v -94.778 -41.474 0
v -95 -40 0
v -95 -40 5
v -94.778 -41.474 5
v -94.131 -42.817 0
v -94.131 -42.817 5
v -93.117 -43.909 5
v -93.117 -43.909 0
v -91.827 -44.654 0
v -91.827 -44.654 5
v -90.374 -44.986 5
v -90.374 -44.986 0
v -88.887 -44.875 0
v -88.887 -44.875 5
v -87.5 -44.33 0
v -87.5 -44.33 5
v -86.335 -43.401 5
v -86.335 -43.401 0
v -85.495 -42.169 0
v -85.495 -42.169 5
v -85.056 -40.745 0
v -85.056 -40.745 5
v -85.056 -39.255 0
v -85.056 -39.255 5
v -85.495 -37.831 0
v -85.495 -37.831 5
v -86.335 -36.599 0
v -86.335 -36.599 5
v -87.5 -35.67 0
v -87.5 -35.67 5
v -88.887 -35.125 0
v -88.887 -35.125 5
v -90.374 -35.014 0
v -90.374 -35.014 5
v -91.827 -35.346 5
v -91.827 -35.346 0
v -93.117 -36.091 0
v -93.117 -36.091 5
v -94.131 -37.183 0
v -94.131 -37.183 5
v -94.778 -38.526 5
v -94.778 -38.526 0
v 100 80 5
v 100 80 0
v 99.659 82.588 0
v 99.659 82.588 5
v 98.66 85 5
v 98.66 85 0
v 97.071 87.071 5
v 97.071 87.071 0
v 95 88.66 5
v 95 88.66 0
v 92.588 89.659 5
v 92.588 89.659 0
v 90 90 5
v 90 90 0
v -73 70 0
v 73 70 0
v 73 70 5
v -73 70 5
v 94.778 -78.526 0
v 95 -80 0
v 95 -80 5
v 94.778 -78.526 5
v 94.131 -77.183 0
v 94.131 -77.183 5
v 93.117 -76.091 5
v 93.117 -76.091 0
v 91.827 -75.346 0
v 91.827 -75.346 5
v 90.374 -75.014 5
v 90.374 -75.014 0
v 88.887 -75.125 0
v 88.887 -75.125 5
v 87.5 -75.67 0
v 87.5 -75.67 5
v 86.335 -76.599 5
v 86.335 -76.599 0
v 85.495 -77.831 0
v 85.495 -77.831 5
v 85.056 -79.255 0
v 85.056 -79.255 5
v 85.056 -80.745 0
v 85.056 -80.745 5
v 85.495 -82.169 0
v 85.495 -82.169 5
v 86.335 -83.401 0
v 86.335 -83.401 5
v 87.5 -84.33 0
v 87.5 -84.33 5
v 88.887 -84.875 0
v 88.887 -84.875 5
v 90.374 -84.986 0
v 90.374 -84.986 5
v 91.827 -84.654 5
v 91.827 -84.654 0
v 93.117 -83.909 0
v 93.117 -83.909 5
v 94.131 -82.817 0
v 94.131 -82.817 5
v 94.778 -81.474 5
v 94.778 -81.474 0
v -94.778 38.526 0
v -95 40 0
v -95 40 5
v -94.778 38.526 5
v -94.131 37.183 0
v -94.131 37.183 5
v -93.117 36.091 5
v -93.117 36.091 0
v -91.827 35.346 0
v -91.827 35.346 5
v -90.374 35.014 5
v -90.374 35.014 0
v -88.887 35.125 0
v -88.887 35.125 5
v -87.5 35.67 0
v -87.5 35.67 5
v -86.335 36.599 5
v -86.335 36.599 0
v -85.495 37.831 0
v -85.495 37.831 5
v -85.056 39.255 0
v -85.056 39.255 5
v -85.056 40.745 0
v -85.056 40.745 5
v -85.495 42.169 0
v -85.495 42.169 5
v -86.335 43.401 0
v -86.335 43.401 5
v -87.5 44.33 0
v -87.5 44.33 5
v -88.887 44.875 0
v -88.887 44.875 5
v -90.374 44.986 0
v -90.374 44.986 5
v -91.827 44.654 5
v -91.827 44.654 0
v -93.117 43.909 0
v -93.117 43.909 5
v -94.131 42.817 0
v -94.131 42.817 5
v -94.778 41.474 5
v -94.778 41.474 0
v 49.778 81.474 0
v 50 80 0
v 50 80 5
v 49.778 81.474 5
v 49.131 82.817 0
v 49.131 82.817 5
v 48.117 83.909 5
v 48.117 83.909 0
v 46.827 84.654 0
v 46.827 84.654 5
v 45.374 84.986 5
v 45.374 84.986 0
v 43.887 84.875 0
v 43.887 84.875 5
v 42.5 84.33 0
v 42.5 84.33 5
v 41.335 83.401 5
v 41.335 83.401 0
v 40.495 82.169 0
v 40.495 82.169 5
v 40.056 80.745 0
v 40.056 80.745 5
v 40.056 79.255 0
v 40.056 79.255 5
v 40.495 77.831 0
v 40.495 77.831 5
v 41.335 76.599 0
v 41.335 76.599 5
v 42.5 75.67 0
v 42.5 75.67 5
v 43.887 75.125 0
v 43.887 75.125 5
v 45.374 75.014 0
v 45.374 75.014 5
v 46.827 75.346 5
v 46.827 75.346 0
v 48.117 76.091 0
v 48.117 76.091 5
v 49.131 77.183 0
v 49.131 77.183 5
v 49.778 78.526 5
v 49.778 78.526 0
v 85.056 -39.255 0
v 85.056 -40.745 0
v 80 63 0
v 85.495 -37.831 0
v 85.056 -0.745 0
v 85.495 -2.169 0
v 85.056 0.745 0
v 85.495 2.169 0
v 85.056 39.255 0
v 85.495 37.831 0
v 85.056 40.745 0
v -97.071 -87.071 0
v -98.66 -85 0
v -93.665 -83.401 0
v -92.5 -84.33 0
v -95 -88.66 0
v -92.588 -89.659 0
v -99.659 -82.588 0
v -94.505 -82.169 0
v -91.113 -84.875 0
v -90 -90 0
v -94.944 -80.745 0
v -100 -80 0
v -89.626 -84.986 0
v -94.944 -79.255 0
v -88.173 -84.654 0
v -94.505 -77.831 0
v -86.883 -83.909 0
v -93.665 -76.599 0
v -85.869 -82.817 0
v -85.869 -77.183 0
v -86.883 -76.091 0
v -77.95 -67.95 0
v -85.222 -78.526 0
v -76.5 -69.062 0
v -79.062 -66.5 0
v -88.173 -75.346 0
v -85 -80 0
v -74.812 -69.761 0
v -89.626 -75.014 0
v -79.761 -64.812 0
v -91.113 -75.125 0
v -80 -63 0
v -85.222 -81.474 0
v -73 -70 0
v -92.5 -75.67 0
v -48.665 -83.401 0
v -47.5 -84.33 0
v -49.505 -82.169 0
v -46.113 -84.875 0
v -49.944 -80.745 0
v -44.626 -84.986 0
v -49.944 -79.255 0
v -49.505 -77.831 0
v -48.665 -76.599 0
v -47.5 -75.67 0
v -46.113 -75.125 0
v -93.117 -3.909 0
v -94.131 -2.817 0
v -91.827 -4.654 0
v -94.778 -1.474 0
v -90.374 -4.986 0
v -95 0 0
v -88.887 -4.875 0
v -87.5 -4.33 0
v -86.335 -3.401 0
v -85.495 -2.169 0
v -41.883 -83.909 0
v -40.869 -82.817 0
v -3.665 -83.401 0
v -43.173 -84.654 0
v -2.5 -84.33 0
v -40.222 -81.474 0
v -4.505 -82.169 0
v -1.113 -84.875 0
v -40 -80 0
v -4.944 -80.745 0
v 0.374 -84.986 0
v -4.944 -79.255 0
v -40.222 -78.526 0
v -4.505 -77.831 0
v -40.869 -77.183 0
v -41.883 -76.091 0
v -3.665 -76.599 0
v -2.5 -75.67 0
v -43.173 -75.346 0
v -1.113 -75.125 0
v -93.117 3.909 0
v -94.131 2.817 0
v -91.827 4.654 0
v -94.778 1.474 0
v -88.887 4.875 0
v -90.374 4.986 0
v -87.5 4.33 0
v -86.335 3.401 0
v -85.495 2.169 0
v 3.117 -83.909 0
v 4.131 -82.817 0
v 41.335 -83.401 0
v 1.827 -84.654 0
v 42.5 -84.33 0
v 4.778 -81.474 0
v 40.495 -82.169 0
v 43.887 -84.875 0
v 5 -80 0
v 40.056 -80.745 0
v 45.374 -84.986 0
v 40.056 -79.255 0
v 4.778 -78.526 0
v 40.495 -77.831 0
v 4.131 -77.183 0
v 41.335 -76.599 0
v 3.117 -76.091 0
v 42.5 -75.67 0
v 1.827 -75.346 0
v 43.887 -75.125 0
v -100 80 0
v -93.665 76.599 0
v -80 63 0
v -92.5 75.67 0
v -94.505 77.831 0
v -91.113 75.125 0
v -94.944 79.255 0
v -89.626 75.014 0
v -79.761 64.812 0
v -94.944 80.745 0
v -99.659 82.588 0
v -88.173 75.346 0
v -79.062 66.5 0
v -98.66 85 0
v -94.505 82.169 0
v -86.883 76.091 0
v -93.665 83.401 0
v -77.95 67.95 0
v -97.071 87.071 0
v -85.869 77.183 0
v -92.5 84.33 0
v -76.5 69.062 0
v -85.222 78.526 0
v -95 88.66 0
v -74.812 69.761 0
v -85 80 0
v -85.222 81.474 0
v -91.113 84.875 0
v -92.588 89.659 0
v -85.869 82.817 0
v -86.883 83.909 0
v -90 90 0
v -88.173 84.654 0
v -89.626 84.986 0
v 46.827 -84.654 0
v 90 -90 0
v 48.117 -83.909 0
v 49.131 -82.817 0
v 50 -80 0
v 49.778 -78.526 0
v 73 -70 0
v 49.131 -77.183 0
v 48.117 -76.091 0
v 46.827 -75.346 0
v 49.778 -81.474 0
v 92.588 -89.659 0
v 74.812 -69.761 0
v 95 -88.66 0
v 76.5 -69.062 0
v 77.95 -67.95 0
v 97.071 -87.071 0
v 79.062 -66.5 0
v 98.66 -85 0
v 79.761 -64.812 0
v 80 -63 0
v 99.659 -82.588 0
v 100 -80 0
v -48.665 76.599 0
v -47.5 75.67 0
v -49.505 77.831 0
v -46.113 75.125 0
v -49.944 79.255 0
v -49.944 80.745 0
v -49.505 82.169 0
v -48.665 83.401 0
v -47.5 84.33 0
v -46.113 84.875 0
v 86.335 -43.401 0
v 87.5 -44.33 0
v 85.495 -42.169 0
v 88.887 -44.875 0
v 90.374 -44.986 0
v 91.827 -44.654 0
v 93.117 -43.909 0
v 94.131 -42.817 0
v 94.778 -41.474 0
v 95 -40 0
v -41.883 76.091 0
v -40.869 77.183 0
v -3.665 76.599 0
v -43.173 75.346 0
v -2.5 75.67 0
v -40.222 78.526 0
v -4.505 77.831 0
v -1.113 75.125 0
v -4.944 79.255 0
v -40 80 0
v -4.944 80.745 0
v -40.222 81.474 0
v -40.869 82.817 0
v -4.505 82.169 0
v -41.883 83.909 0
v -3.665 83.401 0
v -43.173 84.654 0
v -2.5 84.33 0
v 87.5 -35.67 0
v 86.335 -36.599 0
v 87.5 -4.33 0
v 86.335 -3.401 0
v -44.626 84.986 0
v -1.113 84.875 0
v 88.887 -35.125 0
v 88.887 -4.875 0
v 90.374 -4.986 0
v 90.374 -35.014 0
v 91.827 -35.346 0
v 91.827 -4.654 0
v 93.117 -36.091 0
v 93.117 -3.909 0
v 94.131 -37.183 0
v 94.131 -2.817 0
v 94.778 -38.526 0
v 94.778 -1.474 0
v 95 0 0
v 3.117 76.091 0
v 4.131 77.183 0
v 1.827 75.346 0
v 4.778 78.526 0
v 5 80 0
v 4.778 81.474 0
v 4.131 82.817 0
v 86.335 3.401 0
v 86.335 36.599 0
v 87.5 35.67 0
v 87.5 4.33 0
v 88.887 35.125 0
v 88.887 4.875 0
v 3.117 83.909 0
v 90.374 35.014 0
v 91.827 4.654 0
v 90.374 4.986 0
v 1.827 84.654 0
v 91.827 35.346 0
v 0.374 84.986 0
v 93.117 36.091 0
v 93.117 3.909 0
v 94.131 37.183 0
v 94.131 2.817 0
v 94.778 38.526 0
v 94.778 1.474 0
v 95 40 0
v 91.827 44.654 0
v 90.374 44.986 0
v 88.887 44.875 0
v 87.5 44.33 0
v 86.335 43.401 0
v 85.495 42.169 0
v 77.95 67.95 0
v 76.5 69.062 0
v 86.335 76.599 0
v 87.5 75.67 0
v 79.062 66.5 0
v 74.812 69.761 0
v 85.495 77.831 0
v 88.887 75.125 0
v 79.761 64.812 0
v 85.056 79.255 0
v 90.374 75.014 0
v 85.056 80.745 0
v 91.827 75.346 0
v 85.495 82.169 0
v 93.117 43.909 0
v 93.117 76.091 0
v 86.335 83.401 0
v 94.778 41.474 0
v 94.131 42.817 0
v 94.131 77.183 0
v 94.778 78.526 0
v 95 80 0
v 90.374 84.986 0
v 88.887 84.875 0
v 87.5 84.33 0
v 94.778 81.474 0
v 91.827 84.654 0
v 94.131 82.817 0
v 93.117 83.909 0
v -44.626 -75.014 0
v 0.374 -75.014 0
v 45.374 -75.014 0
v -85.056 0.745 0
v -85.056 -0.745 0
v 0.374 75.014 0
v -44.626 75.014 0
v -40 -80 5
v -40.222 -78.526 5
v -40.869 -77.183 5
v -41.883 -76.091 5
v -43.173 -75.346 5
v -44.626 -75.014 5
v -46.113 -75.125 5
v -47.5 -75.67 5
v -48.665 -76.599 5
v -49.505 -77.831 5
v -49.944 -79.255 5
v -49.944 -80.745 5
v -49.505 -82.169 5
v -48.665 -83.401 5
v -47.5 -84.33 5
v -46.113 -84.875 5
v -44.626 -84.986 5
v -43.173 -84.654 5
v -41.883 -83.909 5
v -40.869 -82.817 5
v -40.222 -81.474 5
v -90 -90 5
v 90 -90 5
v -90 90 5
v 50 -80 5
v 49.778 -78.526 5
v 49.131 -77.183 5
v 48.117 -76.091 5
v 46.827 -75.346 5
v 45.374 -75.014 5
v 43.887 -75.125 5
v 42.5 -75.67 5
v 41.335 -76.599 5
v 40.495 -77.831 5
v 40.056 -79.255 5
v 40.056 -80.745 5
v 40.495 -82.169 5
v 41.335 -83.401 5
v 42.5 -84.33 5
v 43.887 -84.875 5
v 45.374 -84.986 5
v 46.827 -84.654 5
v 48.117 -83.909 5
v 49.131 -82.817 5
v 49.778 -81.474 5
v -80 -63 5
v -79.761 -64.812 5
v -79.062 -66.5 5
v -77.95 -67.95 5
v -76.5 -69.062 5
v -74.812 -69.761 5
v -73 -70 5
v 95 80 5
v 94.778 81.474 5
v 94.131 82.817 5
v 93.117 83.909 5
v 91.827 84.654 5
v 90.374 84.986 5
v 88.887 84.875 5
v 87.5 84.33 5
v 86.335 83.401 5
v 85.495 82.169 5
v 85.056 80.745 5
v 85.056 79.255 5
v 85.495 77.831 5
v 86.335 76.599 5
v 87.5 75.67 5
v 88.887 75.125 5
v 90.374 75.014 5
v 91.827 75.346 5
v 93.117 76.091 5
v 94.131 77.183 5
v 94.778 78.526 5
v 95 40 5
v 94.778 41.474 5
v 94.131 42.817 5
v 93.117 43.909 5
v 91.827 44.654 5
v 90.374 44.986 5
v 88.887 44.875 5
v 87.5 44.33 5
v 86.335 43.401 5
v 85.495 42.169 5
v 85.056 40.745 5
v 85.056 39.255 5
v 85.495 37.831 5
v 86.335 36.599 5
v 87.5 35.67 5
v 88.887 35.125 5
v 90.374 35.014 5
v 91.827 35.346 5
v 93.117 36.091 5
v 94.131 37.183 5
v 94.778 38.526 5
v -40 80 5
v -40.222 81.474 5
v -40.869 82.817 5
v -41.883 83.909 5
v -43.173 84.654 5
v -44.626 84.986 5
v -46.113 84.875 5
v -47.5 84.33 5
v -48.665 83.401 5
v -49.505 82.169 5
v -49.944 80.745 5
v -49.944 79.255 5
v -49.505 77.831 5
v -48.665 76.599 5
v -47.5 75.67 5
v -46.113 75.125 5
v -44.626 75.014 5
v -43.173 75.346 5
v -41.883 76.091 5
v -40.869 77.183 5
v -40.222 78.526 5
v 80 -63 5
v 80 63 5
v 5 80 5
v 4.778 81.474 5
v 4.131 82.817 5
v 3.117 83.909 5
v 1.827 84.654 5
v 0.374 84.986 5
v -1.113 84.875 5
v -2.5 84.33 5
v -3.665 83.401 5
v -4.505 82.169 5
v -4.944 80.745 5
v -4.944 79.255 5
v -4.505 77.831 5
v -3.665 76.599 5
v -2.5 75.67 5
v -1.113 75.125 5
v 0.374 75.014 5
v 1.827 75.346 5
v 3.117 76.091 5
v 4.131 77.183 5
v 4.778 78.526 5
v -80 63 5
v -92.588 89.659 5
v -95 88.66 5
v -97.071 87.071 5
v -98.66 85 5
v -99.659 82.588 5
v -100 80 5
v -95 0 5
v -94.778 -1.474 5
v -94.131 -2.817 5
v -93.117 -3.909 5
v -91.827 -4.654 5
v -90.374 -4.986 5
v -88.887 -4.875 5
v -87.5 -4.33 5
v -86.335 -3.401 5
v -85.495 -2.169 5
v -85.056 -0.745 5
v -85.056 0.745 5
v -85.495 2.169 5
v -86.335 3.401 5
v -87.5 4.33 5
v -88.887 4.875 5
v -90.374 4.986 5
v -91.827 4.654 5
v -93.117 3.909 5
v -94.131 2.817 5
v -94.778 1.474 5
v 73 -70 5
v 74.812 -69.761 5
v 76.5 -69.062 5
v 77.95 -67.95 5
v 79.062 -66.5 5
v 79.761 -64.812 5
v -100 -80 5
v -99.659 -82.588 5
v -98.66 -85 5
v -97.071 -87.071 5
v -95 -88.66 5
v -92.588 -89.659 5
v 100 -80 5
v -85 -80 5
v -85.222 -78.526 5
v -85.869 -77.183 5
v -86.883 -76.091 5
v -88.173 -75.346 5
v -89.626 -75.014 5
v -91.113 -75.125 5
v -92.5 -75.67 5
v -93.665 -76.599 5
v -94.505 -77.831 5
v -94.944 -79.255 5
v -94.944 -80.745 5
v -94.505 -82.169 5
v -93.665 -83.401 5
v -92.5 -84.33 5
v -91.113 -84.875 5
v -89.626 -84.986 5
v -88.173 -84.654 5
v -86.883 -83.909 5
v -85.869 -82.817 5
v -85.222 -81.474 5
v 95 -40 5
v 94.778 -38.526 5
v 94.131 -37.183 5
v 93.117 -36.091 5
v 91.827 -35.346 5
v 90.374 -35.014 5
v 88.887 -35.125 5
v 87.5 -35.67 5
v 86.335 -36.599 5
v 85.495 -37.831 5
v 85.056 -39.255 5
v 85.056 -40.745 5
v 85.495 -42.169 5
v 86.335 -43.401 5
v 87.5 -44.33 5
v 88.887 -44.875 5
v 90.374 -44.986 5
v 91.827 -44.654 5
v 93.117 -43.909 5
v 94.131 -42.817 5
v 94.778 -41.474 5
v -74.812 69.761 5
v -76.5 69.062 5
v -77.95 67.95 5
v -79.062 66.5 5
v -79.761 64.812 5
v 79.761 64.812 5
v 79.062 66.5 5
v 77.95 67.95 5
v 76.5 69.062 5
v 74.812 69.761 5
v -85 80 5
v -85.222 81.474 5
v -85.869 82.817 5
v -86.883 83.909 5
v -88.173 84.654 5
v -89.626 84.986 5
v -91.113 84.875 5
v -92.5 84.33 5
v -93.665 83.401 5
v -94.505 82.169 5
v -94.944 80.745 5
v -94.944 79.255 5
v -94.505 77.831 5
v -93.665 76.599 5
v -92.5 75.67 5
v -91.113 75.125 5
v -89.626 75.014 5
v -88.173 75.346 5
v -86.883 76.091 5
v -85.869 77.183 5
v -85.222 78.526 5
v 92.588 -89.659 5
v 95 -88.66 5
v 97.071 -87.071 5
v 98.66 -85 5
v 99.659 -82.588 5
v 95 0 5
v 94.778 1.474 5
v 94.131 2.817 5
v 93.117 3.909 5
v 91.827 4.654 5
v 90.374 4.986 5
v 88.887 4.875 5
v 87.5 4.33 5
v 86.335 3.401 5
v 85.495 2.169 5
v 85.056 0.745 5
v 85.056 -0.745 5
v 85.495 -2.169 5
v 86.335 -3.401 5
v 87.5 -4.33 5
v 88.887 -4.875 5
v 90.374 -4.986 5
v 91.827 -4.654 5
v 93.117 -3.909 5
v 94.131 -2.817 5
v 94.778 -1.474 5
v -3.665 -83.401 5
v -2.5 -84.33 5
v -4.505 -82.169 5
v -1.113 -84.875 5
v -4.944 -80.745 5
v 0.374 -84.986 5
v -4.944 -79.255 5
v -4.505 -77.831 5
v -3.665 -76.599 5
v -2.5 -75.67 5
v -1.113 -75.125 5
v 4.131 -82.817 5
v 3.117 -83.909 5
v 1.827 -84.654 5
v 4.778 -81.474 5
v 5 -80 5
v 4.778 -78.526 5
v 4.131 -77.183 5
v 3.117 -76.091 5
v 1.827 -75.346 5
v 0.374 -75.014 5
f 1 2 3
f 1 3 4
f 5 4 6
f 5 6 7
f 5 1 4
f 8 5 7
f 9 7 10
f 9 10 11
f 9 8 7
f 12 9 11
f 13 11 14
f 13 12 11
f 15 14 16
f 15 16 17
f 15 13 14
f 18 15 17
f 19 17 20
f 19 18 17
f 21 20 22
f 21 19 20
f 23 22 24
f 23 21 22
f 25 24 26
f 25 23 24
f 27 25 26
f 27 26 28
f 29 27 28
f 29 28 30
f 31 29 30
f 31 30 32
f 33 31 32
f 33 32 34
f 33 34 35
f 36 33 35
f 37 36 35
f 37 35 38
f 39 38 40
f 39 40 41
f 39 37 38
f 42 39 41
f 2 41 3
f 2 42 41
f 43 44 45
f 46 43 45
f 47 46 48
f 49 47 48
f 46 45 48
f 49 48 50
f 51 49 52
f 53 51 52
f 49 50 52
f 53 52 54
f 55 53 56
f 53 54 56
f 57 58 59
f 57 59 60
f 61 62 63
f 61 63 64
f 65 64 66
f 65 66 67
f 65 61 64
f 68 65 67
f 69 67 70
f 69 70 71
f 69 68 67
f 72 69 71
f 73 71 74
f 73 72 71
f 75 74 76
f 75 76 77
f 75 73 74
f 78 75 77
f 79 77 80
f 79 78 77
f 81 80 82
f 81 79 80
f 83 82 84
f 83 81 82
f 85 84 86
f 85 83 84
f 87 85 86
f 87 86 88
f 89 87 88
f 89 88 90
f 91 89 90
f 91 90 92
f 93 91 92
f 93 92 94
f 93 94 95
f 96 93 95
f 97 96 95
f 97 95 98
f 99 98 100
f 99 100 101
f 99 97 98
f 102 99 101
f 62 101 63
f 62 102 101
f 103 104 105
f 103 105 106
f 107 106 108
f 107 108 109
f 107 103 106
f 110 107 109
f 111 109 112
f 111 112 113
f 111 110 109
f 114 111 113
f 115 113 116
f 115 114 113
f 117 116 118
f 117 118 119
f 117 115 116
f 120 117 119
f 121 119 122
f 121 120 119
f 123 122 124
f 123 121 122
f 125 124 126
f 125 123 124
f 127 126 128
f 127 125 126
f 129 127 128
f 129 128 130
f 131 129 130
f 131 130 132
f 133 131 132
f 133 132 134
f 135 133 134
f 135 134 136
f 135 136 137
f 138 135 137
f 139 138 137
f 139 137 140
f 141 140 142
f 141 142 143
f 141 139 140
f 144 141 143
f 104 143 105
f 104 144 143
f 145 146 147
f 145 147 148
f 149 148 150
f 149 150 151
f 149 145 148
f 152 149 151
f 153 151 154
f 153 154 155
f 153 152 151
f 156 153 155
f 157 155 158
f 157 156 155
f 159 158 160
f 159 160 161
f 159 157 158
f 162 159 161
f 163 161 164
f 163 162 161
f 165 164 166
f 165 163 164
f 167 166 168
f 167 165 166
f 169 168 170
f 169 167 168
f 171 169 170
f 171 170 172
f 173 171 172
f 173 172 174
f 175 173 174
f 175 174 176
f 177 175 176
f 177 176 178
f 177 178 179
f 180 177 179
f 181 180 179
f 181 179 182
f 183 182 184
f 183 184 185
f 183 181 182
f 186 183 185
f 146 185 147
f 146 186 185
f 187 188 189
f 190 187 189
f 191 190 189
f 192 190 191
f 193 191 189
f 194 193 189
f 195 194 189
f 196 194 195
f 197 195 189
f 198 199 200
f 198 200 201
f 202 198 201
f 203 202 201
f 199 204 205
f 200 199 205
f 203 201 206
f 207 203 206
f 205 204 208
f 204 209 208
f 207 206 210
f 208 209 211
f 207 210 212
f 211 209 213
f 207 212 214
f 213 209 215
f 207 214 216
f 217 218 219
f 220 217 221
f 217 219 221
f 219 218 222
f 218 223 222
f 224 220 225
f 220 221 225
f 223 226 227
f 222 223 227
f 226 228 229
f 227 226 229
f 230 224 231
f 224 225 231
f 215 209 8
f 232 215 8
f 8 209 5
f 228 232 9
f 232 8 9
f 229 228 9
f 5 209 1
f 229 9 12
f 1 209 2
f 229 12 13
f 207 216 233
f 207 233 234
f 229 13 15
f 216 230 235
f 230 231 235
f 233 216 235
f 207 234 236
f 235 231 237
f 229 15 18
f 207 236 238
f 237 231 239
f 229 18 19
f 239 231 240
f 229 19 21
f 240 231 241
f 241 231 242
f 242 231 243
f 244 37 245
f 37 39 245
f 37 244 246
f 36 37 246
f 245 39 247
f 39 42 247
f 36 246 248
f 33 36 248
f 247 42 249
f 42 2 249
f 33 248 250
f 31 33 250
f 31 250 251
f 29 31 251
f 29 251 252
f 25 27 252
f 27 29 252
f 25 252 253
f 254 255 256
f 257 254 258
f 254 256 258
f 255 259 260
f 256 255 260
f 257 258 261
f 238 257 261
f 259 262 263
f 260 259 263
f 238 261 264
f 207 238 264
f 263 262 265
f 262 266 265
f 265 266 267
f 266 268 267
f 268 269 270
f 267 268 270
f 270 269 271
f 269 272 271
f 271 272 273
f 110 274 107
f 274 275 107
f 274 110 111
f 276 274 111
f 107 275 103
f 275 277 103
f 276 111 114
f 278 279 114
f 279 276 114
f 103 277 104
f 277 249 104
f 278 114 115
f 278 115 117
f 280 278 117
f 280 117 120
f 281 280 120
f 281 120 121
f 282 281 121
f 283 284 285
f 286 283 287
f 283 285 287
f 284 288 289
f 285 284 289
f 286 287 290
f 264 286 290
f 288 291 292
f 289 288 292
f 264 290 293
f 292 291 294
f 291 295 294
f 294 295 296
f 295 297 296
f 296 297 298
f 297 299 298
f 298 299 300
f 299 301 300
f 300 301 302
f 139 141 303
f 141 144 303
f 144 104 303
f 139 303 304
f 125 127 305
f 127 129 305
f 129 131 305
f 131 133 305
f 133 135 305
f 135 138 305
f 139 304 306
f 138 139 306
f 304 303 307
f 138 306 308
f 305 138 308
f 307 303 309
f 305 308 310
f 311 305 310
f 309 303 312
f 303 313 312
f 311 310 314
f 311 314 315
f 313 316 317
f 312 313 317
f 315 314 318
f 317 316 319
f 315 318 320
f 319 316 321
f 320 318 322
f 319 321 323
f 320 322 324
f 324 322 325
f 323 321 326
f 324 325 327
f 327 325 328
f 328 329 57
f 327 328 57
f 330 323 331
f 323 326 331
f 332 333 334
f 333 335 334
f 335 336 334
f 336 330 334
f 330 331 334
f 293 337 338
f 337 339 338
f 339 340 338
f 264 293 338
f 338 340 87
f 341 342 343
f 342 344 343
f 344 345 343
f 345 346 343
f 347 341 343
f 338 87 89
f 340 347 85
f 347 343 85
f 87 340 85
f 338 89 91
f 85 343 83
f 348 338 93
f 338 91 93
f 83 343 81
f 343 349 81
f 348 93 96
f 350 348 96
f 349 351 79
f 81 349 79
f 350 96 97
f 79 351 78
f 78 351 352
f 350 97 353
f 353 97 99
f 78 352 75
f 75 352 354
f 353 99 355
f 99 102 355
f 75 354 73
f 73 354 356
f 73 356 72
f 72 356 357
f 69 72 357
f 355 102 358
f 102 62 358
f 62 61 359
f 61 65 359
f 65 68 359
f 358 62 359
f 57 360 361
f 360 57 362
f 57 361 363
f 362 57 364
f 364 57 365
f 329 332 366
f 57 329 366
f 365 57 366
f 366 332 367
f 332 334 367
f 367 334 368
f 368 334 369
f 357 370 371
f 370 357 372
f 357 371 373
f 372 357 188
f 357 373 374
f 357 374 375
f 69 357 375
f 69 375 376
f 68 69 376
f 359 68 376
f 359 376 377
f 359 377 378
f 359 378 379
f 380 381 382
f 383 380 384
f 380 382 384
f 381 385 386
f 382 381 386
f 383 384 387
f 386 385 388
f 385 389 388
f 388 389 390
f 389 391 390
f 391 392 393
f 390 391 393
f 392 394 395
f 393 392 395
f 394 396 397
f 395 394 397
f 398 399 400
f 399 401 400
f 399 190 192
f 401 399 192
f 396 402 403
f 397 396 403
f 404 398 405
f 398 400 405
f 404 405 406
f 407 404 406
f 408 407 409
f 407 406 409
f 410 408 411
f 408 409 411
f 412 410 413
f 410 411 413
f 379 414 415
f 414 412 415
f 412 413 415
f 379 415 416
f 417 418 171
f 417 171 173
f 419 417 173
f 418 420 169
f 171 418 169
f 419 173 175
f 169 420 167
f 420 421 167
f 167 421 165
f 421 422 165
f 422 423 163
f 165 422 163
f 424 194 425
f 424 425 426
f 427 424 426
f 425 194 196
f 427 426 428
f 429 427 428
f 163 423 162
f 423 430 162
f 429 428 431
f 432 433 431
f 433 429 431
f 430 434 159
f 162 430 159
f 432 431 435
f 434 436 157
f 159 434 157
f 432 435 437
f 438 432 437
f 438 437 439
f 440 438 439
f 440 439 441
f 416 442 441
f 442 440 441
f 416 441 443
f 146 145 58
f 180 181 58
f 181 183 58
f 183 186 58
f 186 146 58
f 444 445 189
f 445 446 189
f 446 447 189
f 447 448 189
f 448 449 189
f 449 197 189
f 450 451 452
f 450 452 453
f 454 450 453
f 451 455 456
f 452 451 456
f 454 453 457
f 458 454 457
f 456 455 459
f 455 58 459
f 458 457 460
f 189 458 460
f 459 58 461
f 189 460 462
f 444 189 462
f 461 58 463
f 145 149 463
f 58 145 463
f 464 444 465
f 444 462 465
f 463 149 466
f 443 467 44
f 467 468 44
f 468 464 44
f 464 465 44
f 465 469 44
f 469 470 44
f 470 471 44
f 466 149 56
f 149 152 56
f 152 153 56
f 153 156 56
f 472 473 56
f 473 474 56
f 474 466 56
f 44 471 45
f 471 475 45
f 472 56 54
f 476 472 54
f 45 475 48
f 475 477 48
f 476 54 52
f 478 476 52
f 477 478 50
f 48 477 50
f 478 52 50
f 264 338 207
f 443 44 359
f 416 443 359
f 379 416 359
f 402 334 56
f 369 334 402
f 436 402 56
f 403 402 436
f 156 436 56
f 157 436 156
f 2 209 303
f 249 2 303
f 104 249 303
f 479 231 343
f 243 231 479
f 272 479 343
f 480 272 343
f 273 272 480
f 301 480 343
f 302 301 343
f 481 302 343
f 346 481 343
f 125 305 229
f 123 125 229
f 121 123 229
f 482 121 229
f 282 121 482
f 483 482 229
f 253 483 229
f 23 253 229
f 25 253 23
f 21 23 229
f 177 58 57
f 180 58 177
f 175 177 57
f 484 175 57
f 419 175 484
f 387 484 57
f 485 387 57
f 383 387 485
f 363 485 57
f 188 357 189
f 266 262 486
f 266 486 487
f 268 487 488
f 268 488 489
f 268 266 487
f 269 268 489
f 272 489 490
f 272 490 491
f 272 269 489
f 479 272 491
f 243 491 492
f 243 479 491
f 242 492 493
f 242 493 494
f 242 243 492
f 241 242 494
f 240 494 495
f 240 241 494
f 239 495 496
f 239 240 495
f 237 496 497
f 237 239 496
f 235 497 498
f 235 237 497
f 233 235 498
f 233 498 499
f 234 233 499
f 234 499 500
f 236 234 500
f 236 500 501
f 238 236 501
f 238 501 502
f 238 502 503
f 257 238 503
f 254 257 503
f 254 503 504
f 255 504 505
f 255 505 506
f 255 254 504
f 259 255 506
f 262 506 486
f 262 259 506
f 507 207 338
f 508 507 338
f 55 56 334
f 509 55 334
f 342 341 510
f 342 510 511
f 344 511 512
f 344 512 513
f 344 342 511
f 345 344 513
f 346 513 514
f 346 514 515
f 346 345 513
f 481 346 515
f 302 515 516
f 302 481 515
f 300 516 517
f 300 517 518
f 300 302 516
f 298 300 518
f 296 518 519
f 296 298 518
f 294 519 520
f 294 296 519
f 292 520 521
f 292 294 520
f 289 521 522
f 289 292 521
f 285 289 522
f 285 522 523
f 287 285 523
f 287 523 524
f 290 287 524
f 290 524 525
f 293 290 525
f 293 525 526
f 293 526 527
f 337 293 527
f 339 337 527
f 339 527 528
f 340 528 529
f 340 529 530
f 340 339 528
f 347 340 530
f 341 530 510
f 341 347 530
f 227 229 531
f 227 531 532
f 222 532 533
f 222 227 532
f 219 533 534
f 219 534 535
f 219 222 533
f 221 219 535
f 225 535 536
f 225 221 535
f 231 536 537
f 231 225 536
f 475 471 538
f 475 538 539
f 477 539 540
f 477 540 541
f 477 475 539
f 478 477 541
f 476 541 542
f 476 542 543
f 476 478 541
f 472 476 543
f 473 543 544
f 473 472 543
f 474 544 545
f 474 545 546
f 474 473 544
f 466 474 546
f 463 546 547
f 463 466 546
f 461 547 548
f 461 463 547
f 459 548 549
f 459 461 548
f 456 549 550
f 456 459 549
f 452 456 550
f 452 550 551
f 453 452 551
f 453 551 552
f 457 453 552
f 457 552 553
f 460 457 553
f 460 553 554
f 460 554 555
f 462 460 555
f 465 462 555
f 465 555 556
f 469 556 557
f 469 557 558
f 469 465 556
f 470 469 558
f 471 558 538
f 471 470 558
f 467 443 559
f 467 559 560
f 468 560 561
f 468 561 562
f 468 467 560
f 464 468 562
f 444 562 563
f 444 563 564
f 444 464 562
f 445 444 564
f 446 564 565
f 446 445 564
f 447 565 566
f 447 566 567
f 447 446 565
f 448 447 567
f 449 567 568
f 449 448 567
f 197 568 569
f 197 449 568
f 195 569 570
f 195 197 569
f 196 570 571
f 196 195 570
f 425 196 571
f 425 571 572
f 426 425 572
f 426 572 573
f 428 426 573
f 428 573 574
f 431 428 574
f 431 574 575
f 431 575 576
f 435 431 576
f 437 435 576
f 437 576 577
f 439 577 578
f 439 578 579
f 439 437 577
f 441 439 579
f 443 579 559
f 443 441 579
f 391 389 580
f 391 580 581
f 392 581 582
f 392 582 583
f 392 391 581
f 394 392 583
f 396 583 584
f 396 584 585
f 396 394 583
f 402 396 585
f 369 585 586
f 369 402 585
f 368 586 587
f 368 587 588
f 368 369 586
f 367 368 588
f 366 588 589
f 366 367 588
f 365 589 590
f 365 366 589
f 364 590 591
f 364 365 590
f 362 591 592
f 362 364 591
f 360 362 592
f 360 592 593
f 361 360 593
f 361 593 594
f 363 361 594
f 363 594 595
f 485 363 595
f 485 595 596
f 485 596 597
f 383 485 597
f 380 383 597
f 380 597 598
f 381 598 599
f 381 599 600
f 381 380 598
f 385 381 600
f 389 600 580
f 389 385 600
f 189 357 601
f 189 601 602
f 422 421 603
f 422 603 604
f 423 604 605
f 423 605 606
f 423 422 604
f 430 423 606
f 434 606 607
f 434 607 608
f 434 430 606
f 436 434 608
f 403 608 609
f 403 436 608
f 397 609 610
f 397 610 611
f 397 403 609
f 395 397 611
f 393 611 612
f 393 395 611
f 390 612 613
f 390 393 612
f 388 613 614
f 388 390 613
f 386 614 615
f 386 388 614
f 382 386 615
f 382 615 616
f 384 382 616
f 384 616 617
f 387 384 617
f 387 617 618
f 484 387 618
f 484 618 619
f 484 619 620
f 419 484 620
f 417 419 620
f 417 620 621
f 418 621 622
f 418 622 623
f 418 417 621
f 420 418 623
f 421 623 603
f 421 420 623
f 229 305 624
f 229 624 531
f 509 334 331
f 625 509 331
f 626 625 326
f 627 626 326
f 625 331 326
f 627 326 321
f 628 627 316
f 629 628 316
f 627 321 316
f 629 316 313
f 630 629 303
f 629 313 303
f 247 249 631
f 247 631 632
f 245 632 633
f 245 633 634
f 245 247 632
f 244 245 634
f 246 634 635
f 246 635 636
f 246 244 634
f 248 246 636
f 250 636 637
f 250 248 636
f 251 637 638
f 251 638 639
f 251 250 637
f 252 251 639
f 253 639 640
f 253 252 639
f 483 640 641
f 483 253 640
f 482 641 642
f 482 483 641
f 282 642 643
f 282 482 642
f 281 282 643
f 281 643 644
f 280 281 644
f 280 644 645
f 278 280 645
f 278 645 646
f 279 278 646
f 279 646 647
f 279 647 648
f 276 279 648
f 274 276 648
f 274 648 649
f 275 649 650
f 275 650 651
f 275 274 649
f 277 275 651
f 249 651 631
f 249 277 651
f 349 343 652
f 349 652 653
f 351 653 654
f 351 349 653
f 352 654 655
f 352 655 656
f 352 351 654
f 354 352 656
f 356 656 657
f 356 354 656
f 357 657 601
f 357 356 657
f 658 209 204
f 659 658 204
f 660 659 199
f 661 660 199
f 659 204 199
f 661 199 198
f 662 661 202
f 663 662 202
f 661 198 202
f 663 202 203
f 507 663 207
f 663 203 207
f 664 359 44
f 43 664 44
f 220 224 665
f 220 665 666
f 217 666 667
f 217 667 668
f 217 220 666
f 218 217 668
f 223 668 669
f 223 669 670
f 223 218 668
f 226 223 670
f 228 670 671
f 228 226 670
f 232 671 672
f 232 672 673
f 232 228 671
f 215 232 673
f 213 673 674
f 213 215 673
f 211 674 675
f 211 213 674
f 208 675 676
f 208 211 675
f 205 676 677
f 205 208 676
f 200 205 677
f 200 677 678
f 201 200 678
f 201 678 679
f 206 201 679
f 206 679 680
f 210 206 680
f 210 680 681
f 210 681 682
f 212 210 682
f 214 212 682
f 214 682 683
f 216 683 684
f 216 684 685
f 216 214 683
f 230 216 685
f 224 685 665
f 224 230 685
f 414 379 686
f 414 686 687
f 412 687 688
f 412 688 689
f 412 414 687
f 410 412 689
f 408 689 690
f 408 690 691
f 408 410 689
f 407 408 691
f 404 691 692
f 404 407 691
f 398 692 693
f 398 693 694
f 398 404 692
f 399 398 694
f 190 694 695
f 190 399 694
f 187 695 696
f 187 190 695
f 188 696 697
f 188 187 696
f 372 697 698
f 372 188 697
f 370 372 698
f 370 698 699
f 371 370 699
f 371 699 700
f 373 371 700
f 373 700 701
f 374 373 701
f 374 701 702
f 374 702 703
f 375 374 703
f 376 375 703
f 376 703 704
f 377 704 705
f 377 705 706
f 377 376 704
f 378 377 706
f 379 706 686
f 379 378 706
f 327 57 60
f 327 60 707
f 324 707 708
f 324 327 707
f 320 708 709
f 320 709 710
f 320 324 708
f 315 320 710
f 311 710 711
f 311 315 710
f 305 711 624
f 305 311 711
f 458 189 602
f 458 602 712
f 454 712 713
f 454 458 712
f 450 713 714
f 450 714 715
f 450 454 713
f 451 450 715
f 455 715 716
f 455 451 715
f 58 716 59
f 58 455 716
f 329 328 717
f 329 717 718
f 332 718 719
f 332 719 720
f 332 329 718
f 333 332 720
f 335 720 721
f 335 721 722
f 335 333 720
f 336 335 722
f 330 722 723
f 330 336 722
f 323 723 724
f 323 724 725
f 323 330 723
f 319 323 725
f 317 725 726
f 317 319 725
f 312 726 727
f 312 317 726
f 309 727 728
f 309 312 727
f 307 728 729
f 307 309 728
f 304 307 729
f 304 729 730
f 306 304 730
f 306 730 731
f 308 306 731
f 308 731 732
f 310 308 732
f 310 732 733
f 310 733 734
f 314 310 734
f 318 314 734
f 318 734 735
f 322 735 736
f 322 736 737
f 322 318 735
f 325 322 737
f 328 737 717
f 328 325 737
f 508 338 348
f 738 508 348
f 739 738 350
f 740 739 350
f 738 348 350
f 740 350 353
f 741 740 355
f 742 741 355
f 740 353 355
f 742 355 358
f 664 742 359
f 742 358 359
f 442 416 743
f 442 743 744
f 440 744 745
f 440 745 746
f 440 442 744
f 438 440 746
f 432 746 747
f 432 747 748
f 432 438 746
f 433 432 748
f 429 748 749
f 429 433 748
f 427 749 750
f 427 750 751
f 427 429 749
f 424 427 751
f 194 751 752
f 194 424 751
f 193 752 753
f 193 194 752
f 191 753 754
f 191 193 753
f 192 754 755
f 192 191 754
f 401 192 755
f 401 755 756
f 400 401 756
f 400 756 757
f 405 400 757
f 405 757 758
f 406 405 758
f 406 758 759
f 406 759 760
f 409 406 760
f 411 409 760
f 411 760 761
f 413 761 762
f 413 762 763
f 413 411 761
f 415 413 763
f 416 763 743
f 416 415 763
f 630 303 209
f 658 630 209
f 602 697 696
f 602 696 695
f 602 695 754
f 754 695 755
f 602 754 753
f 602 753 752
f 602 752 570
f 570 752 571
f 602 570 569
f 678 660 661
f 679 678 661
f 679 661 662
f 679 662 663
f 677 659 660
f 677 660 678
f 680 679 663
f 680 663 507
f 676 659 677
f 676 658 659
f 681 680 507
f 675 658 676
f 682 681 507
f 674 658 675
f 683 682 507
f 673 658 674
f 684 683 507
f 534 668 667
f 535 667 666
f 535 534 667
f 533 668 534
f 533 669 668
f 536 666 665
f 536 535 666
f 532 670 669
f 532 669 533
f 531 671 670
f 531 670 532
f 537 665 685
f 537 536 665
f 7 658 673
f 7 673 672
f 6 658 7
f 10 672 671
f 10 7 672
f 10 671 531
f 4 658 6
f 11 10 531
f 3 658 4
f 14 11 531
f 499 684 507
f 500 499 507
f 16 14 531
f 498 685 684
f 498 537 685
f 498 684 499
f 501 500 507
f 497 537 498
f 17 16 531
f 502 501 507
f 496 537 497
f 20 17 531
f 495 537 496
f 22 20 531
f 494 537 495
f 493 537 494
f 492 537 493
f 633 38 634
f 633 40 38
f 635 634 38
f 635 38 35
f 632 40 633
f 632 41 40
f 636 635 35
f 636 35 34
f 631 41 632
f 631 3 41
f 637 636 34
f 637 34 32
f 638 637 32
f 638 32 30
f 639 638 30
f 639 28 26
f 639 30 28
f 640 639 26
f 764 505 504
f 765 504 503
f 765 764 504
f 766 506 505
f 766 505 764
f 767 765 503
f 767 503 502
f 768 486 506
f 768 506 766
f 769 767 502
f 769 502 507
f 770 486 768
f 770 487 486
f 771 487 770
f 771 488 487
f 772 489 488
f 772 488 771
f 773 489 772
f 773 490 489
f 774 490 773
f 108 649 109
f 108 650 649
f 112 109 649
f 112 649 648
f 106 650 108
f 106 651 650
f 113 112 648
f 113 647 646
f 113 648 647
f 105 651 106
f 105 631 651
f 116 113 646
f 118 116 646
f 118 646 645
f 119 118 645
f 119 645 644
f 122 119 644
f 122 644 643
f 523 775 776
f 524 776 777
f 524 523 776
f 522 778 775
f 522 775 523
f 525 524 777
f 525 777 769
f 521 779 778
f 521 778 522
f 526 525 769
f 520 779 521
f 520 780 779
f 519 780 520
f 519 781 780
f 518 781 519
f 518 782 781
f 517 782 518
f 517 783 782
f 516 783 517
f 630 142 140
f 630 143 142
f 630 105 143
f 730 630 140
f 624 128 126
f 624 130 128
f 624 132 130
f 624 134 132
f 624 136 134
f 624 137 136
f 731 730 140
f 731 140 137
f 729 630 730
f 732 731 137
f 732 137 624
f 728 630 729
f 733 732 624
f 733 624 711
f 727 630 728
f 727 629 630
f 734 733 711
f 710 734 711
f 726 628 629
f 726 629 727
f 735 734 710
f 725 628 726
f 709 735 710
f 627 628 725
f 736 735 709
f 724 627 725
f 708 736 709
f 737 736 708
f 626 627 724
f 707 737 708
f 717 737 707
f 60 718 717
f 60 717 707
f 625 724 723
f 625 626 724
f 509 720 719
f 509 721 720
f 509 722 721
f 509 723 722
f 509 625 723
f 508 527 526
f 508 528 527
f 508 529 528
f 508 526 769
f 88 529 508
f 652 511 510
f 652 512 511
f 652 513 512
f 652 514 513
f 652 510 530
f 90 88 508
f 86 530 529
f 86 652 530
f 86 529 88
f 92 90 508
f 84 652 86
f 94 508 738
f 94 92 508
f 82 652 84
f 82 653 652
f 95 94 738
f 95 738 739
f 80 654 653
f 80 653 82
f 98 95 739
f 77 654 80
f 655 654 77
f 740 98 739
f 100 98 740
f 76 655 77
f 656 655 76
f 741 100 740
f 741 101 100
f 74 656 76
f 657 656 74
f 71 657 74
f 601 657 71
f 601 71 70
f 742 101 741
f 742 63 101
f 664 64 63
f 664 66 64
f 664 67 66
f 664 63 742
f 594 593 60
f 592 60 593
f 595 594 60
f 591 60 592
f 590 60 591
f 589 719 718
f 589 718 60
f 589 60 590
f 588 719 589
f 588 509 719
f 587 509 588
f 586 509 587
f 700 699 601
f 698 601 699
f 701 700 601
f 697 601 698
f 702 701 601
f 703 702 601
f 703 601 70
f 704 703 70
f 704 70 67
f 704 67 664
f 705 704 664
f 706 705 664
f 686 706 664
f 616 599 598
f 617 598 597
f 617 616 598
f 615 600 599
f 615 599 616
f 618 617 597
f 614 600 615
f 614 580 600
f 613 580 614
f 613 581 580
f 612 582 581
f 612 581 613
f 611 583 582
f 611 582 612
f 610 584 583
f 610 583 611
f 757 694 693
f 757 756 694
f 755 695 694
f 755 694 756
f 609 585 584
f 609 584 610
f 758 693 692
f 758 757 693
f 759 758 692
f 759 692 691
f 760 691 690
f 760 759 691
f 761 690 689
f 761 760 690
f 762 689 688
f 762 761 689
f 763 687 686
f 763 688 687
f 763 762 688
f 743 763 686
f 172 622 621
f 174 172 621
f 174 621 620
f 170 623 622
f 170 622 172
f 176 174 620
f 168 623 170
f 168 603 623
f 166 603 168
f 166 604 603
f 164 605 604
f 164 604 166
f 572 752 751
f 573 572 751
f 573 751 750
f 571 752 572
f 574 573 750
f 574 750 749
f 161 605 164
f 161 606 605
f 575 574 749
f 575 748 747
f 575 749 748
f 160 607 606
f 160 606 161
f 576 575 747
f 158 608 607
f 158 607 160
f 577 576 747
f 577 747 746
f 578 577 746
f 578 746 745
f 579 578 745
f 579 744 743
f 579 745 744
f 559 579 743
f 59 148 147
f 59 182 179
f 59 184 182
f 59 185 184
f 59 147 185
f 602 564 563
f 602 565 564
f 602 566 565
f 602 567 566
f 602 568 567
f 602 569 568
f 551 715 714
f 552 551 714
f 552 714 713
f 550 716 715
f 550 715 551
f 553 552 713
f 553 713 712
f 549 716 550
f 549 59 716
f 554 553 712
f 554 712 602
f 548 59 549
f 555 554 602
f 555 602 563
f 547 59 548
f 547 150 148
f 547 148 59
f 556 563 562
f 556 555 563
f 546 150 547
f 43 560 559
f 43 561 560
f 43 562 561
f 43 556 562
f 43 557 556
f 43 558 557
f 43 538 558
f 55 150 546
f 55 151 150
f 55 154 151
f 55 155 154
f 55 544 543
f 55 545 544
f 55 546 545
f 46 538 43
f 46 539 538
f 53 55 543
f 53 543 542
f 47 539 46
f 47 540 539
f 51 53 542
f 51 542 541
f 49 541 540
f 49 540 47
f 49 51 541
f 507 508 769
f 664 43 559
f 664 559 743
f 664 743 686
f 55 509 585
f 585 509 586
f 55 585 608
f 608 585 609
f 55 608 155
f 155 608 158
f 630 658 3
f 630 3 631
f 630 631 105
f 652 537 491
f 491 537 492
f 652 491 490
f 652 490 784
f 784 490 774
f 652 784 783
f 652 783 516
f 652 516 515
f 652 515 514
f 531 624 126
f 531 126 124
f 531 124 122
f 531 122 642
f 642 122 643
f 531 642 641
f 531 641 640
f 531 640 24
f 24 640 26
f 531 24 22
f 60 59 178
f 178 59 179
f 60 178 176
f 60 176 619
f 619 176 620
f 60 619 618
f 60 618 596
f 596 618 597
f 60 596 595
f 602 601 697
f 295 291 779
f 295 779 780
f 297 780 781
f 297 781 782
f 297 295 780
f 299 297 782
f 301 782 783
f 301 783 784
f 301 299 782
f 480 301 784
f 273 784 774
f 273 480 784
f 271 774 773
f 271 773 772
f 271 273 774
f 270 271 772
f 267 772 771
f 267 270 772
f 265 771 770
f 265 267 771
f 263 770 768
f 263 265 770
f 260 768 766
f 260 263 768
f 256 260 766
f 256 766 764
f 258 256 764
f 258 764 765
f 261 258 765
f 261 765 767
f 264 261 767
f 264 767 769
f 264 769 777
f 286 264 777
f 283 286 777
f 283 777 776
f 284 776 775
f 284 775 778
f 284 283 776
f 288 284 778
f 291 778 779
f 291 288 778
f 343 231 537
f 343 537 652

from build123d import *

# Parameters (mm, degrees)
SKETCH_1_R      = 5
EXTRUDE_1_DEPTH = 5


with BuildPart() as part:
    # 草图1 → 凸台-拉伸1 (new body)
    with BuildSketch(Plane.XY):
        with BuildLine():
            Line((-90, -90), (90, -90))
            ThreePointArc((90, -90), (97.071067812, -87.071067812), (100, -80))
            Line((100, -80), (100, 80))
            ThreePointArc((100, 80), (97.071067812, 87.071067812), (90, 90))
            Line((90, 90), (-90, 90))
            ThreePointArc((-90, 90), (-97.071067812, 87.071067812), (-100, 80))
            Line((-100, 80), (-100, -80))
            ThreePointArc((-100, -80), (-97.071067812, -87.071067812), (-90, -90))
        make_face()
        with Locations((90, -80)):
            Circle(SKETCH_1_R, mode=Mode.SUBTRACT)
        with Locations((90, 80)):
            Circle(SKETCH_1_R, mode=Mode.SUBTRACT)
        with Locations((-90, 80)):
            Circle(SKETCH_1_R, mode=Mode.SUBTRACT)
        with Locations((-90, -80)):
            Circle(SKETCH_1_R, mode=Mode.SUBTRACT)
        with Locations((90, 0)):
            Circle(SKETCH_1_R, mode=Mode.SUBTRACT)
        with Locations((90, -40)):
            Circle(SKETCH_1_R, mode=Mode.SUBTRACT)
        with Locations((90, 40)):
            Circle(SKETCH_1_R, mode=Mode.SUBTRACT)
        with Locations(Location((-90, -40, 0), (0, 0, 180))):
            Circle(SKETCH_1_R, mode=Mode.SUBTRACT)
        with Locations(Location((-90, 0, 0), (0, 0, 180))):
            Circle(SKETCH_1_R, mode=Mode.SUBTRACT)
        with Locations(Location((-90, 40, 0), (0, 0, 180))):
            Circle(SKETCH_1_R, mode=Mode.SUBTRACT)
        with Locations((0, 80)):
            Circle(SKETCH_1_R, mode=Mode.SUBTRACT)
        with Locations((-45, 80)):
            Circle(SKETCH_1_R, mode=Mode.SUBTRACT)
        with Locations((45, 80)):
            Circle(SKETCH_1_R, mode=Mode.SUBTRACT)
        with Locations((0, -80)):
            Circle(SKETCH_1_R, mode=Mode.SUBTRACT)
        with Locations((-45, -80)):
            Circle(SKETCH_1_R, mode=Mode.SUBTRACT)
        with Locations((45, -80)):
            Circle(SKETCH_1_R, mode=Mode.SUBTRACT)
        with BuildLine():
            Line((-73, -70), (73, -70))
            ThreePointArc((73, -70), (77.949747468, -67.949747468), (80, -63))
            Line((80, -63), (80, 63))
            ThreePointArc((80, 63), (77.949747468, 67.949747468), (73, 70))
            Line((73, 70), (-73, 70))
            ThreePointArc((-73, 70), (-77.949747468, 67.949747468), (-80, 63))
            Line((-80, 63), (-80, -63))
            ThreePointArc((-80, -63), (-77.949747468, -67.949747468), (-73, -70))
        make_face(mode=Mode.SUBTRACT)
    extrude(amount=EXTRUDE_1_DEPTH)


solid = part.part
